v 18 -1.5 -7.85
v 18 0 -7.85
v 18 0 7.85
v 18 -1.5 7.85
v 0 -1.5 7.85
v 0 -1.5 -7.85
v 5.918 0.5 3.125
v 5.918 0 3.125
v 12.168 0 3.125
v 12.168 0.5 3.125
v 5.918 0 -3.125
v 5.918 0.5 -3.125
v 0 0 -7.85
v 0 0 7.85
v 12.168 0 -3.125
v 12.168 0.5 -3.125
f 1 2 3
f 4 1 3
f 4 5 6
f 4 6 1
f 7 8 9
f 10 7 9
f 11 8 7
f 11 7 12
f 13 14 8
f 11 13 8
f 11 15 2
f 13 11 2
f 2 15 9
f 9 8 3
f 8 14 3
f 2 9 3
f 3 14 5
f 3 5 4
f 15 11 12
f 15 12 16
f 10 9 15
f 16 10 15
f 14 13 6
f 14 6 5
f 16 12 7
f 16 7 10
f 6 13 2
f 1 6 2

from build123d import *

# Parameters (mm, degrees)
CROQUIS1_W              = 18
CROQUIS1_H              = 15.7
SALIENTE_EXTRUIR1_DEPTH = 1.5
CROQUIS2_W              = 6.25
CROQUIS2_H              = 6.25
SALIENTE_EXTRUIR2_DEPTH = 0.5


with BuildPart() as part:
    # Croquis1 → Saliente-Extruir1 (new body)
    with BuildSketch(Plane.XZ):
        with Locations((9, 0)):
            Rectangle(CROQUIS1_W, CROQUIS1_H)
    extrude(amount=SALIENTE_EXTRUIR1_DEPTH)

    # Croquis2 → Saliente-Extruir2 (add)
    with BuildSketch(Plane(origin=(0, 0, 0), x_dir=(1, 0, 0), z_dir=(0, 1, 0))):
        with Locations((9.04271605, 0)):
            Rectangle(CROQUIS2_W, CROQUIS2_H)
    extrude(amount=SALIENTE_EXTRUIR2_DEPTH)


solid = part.part
